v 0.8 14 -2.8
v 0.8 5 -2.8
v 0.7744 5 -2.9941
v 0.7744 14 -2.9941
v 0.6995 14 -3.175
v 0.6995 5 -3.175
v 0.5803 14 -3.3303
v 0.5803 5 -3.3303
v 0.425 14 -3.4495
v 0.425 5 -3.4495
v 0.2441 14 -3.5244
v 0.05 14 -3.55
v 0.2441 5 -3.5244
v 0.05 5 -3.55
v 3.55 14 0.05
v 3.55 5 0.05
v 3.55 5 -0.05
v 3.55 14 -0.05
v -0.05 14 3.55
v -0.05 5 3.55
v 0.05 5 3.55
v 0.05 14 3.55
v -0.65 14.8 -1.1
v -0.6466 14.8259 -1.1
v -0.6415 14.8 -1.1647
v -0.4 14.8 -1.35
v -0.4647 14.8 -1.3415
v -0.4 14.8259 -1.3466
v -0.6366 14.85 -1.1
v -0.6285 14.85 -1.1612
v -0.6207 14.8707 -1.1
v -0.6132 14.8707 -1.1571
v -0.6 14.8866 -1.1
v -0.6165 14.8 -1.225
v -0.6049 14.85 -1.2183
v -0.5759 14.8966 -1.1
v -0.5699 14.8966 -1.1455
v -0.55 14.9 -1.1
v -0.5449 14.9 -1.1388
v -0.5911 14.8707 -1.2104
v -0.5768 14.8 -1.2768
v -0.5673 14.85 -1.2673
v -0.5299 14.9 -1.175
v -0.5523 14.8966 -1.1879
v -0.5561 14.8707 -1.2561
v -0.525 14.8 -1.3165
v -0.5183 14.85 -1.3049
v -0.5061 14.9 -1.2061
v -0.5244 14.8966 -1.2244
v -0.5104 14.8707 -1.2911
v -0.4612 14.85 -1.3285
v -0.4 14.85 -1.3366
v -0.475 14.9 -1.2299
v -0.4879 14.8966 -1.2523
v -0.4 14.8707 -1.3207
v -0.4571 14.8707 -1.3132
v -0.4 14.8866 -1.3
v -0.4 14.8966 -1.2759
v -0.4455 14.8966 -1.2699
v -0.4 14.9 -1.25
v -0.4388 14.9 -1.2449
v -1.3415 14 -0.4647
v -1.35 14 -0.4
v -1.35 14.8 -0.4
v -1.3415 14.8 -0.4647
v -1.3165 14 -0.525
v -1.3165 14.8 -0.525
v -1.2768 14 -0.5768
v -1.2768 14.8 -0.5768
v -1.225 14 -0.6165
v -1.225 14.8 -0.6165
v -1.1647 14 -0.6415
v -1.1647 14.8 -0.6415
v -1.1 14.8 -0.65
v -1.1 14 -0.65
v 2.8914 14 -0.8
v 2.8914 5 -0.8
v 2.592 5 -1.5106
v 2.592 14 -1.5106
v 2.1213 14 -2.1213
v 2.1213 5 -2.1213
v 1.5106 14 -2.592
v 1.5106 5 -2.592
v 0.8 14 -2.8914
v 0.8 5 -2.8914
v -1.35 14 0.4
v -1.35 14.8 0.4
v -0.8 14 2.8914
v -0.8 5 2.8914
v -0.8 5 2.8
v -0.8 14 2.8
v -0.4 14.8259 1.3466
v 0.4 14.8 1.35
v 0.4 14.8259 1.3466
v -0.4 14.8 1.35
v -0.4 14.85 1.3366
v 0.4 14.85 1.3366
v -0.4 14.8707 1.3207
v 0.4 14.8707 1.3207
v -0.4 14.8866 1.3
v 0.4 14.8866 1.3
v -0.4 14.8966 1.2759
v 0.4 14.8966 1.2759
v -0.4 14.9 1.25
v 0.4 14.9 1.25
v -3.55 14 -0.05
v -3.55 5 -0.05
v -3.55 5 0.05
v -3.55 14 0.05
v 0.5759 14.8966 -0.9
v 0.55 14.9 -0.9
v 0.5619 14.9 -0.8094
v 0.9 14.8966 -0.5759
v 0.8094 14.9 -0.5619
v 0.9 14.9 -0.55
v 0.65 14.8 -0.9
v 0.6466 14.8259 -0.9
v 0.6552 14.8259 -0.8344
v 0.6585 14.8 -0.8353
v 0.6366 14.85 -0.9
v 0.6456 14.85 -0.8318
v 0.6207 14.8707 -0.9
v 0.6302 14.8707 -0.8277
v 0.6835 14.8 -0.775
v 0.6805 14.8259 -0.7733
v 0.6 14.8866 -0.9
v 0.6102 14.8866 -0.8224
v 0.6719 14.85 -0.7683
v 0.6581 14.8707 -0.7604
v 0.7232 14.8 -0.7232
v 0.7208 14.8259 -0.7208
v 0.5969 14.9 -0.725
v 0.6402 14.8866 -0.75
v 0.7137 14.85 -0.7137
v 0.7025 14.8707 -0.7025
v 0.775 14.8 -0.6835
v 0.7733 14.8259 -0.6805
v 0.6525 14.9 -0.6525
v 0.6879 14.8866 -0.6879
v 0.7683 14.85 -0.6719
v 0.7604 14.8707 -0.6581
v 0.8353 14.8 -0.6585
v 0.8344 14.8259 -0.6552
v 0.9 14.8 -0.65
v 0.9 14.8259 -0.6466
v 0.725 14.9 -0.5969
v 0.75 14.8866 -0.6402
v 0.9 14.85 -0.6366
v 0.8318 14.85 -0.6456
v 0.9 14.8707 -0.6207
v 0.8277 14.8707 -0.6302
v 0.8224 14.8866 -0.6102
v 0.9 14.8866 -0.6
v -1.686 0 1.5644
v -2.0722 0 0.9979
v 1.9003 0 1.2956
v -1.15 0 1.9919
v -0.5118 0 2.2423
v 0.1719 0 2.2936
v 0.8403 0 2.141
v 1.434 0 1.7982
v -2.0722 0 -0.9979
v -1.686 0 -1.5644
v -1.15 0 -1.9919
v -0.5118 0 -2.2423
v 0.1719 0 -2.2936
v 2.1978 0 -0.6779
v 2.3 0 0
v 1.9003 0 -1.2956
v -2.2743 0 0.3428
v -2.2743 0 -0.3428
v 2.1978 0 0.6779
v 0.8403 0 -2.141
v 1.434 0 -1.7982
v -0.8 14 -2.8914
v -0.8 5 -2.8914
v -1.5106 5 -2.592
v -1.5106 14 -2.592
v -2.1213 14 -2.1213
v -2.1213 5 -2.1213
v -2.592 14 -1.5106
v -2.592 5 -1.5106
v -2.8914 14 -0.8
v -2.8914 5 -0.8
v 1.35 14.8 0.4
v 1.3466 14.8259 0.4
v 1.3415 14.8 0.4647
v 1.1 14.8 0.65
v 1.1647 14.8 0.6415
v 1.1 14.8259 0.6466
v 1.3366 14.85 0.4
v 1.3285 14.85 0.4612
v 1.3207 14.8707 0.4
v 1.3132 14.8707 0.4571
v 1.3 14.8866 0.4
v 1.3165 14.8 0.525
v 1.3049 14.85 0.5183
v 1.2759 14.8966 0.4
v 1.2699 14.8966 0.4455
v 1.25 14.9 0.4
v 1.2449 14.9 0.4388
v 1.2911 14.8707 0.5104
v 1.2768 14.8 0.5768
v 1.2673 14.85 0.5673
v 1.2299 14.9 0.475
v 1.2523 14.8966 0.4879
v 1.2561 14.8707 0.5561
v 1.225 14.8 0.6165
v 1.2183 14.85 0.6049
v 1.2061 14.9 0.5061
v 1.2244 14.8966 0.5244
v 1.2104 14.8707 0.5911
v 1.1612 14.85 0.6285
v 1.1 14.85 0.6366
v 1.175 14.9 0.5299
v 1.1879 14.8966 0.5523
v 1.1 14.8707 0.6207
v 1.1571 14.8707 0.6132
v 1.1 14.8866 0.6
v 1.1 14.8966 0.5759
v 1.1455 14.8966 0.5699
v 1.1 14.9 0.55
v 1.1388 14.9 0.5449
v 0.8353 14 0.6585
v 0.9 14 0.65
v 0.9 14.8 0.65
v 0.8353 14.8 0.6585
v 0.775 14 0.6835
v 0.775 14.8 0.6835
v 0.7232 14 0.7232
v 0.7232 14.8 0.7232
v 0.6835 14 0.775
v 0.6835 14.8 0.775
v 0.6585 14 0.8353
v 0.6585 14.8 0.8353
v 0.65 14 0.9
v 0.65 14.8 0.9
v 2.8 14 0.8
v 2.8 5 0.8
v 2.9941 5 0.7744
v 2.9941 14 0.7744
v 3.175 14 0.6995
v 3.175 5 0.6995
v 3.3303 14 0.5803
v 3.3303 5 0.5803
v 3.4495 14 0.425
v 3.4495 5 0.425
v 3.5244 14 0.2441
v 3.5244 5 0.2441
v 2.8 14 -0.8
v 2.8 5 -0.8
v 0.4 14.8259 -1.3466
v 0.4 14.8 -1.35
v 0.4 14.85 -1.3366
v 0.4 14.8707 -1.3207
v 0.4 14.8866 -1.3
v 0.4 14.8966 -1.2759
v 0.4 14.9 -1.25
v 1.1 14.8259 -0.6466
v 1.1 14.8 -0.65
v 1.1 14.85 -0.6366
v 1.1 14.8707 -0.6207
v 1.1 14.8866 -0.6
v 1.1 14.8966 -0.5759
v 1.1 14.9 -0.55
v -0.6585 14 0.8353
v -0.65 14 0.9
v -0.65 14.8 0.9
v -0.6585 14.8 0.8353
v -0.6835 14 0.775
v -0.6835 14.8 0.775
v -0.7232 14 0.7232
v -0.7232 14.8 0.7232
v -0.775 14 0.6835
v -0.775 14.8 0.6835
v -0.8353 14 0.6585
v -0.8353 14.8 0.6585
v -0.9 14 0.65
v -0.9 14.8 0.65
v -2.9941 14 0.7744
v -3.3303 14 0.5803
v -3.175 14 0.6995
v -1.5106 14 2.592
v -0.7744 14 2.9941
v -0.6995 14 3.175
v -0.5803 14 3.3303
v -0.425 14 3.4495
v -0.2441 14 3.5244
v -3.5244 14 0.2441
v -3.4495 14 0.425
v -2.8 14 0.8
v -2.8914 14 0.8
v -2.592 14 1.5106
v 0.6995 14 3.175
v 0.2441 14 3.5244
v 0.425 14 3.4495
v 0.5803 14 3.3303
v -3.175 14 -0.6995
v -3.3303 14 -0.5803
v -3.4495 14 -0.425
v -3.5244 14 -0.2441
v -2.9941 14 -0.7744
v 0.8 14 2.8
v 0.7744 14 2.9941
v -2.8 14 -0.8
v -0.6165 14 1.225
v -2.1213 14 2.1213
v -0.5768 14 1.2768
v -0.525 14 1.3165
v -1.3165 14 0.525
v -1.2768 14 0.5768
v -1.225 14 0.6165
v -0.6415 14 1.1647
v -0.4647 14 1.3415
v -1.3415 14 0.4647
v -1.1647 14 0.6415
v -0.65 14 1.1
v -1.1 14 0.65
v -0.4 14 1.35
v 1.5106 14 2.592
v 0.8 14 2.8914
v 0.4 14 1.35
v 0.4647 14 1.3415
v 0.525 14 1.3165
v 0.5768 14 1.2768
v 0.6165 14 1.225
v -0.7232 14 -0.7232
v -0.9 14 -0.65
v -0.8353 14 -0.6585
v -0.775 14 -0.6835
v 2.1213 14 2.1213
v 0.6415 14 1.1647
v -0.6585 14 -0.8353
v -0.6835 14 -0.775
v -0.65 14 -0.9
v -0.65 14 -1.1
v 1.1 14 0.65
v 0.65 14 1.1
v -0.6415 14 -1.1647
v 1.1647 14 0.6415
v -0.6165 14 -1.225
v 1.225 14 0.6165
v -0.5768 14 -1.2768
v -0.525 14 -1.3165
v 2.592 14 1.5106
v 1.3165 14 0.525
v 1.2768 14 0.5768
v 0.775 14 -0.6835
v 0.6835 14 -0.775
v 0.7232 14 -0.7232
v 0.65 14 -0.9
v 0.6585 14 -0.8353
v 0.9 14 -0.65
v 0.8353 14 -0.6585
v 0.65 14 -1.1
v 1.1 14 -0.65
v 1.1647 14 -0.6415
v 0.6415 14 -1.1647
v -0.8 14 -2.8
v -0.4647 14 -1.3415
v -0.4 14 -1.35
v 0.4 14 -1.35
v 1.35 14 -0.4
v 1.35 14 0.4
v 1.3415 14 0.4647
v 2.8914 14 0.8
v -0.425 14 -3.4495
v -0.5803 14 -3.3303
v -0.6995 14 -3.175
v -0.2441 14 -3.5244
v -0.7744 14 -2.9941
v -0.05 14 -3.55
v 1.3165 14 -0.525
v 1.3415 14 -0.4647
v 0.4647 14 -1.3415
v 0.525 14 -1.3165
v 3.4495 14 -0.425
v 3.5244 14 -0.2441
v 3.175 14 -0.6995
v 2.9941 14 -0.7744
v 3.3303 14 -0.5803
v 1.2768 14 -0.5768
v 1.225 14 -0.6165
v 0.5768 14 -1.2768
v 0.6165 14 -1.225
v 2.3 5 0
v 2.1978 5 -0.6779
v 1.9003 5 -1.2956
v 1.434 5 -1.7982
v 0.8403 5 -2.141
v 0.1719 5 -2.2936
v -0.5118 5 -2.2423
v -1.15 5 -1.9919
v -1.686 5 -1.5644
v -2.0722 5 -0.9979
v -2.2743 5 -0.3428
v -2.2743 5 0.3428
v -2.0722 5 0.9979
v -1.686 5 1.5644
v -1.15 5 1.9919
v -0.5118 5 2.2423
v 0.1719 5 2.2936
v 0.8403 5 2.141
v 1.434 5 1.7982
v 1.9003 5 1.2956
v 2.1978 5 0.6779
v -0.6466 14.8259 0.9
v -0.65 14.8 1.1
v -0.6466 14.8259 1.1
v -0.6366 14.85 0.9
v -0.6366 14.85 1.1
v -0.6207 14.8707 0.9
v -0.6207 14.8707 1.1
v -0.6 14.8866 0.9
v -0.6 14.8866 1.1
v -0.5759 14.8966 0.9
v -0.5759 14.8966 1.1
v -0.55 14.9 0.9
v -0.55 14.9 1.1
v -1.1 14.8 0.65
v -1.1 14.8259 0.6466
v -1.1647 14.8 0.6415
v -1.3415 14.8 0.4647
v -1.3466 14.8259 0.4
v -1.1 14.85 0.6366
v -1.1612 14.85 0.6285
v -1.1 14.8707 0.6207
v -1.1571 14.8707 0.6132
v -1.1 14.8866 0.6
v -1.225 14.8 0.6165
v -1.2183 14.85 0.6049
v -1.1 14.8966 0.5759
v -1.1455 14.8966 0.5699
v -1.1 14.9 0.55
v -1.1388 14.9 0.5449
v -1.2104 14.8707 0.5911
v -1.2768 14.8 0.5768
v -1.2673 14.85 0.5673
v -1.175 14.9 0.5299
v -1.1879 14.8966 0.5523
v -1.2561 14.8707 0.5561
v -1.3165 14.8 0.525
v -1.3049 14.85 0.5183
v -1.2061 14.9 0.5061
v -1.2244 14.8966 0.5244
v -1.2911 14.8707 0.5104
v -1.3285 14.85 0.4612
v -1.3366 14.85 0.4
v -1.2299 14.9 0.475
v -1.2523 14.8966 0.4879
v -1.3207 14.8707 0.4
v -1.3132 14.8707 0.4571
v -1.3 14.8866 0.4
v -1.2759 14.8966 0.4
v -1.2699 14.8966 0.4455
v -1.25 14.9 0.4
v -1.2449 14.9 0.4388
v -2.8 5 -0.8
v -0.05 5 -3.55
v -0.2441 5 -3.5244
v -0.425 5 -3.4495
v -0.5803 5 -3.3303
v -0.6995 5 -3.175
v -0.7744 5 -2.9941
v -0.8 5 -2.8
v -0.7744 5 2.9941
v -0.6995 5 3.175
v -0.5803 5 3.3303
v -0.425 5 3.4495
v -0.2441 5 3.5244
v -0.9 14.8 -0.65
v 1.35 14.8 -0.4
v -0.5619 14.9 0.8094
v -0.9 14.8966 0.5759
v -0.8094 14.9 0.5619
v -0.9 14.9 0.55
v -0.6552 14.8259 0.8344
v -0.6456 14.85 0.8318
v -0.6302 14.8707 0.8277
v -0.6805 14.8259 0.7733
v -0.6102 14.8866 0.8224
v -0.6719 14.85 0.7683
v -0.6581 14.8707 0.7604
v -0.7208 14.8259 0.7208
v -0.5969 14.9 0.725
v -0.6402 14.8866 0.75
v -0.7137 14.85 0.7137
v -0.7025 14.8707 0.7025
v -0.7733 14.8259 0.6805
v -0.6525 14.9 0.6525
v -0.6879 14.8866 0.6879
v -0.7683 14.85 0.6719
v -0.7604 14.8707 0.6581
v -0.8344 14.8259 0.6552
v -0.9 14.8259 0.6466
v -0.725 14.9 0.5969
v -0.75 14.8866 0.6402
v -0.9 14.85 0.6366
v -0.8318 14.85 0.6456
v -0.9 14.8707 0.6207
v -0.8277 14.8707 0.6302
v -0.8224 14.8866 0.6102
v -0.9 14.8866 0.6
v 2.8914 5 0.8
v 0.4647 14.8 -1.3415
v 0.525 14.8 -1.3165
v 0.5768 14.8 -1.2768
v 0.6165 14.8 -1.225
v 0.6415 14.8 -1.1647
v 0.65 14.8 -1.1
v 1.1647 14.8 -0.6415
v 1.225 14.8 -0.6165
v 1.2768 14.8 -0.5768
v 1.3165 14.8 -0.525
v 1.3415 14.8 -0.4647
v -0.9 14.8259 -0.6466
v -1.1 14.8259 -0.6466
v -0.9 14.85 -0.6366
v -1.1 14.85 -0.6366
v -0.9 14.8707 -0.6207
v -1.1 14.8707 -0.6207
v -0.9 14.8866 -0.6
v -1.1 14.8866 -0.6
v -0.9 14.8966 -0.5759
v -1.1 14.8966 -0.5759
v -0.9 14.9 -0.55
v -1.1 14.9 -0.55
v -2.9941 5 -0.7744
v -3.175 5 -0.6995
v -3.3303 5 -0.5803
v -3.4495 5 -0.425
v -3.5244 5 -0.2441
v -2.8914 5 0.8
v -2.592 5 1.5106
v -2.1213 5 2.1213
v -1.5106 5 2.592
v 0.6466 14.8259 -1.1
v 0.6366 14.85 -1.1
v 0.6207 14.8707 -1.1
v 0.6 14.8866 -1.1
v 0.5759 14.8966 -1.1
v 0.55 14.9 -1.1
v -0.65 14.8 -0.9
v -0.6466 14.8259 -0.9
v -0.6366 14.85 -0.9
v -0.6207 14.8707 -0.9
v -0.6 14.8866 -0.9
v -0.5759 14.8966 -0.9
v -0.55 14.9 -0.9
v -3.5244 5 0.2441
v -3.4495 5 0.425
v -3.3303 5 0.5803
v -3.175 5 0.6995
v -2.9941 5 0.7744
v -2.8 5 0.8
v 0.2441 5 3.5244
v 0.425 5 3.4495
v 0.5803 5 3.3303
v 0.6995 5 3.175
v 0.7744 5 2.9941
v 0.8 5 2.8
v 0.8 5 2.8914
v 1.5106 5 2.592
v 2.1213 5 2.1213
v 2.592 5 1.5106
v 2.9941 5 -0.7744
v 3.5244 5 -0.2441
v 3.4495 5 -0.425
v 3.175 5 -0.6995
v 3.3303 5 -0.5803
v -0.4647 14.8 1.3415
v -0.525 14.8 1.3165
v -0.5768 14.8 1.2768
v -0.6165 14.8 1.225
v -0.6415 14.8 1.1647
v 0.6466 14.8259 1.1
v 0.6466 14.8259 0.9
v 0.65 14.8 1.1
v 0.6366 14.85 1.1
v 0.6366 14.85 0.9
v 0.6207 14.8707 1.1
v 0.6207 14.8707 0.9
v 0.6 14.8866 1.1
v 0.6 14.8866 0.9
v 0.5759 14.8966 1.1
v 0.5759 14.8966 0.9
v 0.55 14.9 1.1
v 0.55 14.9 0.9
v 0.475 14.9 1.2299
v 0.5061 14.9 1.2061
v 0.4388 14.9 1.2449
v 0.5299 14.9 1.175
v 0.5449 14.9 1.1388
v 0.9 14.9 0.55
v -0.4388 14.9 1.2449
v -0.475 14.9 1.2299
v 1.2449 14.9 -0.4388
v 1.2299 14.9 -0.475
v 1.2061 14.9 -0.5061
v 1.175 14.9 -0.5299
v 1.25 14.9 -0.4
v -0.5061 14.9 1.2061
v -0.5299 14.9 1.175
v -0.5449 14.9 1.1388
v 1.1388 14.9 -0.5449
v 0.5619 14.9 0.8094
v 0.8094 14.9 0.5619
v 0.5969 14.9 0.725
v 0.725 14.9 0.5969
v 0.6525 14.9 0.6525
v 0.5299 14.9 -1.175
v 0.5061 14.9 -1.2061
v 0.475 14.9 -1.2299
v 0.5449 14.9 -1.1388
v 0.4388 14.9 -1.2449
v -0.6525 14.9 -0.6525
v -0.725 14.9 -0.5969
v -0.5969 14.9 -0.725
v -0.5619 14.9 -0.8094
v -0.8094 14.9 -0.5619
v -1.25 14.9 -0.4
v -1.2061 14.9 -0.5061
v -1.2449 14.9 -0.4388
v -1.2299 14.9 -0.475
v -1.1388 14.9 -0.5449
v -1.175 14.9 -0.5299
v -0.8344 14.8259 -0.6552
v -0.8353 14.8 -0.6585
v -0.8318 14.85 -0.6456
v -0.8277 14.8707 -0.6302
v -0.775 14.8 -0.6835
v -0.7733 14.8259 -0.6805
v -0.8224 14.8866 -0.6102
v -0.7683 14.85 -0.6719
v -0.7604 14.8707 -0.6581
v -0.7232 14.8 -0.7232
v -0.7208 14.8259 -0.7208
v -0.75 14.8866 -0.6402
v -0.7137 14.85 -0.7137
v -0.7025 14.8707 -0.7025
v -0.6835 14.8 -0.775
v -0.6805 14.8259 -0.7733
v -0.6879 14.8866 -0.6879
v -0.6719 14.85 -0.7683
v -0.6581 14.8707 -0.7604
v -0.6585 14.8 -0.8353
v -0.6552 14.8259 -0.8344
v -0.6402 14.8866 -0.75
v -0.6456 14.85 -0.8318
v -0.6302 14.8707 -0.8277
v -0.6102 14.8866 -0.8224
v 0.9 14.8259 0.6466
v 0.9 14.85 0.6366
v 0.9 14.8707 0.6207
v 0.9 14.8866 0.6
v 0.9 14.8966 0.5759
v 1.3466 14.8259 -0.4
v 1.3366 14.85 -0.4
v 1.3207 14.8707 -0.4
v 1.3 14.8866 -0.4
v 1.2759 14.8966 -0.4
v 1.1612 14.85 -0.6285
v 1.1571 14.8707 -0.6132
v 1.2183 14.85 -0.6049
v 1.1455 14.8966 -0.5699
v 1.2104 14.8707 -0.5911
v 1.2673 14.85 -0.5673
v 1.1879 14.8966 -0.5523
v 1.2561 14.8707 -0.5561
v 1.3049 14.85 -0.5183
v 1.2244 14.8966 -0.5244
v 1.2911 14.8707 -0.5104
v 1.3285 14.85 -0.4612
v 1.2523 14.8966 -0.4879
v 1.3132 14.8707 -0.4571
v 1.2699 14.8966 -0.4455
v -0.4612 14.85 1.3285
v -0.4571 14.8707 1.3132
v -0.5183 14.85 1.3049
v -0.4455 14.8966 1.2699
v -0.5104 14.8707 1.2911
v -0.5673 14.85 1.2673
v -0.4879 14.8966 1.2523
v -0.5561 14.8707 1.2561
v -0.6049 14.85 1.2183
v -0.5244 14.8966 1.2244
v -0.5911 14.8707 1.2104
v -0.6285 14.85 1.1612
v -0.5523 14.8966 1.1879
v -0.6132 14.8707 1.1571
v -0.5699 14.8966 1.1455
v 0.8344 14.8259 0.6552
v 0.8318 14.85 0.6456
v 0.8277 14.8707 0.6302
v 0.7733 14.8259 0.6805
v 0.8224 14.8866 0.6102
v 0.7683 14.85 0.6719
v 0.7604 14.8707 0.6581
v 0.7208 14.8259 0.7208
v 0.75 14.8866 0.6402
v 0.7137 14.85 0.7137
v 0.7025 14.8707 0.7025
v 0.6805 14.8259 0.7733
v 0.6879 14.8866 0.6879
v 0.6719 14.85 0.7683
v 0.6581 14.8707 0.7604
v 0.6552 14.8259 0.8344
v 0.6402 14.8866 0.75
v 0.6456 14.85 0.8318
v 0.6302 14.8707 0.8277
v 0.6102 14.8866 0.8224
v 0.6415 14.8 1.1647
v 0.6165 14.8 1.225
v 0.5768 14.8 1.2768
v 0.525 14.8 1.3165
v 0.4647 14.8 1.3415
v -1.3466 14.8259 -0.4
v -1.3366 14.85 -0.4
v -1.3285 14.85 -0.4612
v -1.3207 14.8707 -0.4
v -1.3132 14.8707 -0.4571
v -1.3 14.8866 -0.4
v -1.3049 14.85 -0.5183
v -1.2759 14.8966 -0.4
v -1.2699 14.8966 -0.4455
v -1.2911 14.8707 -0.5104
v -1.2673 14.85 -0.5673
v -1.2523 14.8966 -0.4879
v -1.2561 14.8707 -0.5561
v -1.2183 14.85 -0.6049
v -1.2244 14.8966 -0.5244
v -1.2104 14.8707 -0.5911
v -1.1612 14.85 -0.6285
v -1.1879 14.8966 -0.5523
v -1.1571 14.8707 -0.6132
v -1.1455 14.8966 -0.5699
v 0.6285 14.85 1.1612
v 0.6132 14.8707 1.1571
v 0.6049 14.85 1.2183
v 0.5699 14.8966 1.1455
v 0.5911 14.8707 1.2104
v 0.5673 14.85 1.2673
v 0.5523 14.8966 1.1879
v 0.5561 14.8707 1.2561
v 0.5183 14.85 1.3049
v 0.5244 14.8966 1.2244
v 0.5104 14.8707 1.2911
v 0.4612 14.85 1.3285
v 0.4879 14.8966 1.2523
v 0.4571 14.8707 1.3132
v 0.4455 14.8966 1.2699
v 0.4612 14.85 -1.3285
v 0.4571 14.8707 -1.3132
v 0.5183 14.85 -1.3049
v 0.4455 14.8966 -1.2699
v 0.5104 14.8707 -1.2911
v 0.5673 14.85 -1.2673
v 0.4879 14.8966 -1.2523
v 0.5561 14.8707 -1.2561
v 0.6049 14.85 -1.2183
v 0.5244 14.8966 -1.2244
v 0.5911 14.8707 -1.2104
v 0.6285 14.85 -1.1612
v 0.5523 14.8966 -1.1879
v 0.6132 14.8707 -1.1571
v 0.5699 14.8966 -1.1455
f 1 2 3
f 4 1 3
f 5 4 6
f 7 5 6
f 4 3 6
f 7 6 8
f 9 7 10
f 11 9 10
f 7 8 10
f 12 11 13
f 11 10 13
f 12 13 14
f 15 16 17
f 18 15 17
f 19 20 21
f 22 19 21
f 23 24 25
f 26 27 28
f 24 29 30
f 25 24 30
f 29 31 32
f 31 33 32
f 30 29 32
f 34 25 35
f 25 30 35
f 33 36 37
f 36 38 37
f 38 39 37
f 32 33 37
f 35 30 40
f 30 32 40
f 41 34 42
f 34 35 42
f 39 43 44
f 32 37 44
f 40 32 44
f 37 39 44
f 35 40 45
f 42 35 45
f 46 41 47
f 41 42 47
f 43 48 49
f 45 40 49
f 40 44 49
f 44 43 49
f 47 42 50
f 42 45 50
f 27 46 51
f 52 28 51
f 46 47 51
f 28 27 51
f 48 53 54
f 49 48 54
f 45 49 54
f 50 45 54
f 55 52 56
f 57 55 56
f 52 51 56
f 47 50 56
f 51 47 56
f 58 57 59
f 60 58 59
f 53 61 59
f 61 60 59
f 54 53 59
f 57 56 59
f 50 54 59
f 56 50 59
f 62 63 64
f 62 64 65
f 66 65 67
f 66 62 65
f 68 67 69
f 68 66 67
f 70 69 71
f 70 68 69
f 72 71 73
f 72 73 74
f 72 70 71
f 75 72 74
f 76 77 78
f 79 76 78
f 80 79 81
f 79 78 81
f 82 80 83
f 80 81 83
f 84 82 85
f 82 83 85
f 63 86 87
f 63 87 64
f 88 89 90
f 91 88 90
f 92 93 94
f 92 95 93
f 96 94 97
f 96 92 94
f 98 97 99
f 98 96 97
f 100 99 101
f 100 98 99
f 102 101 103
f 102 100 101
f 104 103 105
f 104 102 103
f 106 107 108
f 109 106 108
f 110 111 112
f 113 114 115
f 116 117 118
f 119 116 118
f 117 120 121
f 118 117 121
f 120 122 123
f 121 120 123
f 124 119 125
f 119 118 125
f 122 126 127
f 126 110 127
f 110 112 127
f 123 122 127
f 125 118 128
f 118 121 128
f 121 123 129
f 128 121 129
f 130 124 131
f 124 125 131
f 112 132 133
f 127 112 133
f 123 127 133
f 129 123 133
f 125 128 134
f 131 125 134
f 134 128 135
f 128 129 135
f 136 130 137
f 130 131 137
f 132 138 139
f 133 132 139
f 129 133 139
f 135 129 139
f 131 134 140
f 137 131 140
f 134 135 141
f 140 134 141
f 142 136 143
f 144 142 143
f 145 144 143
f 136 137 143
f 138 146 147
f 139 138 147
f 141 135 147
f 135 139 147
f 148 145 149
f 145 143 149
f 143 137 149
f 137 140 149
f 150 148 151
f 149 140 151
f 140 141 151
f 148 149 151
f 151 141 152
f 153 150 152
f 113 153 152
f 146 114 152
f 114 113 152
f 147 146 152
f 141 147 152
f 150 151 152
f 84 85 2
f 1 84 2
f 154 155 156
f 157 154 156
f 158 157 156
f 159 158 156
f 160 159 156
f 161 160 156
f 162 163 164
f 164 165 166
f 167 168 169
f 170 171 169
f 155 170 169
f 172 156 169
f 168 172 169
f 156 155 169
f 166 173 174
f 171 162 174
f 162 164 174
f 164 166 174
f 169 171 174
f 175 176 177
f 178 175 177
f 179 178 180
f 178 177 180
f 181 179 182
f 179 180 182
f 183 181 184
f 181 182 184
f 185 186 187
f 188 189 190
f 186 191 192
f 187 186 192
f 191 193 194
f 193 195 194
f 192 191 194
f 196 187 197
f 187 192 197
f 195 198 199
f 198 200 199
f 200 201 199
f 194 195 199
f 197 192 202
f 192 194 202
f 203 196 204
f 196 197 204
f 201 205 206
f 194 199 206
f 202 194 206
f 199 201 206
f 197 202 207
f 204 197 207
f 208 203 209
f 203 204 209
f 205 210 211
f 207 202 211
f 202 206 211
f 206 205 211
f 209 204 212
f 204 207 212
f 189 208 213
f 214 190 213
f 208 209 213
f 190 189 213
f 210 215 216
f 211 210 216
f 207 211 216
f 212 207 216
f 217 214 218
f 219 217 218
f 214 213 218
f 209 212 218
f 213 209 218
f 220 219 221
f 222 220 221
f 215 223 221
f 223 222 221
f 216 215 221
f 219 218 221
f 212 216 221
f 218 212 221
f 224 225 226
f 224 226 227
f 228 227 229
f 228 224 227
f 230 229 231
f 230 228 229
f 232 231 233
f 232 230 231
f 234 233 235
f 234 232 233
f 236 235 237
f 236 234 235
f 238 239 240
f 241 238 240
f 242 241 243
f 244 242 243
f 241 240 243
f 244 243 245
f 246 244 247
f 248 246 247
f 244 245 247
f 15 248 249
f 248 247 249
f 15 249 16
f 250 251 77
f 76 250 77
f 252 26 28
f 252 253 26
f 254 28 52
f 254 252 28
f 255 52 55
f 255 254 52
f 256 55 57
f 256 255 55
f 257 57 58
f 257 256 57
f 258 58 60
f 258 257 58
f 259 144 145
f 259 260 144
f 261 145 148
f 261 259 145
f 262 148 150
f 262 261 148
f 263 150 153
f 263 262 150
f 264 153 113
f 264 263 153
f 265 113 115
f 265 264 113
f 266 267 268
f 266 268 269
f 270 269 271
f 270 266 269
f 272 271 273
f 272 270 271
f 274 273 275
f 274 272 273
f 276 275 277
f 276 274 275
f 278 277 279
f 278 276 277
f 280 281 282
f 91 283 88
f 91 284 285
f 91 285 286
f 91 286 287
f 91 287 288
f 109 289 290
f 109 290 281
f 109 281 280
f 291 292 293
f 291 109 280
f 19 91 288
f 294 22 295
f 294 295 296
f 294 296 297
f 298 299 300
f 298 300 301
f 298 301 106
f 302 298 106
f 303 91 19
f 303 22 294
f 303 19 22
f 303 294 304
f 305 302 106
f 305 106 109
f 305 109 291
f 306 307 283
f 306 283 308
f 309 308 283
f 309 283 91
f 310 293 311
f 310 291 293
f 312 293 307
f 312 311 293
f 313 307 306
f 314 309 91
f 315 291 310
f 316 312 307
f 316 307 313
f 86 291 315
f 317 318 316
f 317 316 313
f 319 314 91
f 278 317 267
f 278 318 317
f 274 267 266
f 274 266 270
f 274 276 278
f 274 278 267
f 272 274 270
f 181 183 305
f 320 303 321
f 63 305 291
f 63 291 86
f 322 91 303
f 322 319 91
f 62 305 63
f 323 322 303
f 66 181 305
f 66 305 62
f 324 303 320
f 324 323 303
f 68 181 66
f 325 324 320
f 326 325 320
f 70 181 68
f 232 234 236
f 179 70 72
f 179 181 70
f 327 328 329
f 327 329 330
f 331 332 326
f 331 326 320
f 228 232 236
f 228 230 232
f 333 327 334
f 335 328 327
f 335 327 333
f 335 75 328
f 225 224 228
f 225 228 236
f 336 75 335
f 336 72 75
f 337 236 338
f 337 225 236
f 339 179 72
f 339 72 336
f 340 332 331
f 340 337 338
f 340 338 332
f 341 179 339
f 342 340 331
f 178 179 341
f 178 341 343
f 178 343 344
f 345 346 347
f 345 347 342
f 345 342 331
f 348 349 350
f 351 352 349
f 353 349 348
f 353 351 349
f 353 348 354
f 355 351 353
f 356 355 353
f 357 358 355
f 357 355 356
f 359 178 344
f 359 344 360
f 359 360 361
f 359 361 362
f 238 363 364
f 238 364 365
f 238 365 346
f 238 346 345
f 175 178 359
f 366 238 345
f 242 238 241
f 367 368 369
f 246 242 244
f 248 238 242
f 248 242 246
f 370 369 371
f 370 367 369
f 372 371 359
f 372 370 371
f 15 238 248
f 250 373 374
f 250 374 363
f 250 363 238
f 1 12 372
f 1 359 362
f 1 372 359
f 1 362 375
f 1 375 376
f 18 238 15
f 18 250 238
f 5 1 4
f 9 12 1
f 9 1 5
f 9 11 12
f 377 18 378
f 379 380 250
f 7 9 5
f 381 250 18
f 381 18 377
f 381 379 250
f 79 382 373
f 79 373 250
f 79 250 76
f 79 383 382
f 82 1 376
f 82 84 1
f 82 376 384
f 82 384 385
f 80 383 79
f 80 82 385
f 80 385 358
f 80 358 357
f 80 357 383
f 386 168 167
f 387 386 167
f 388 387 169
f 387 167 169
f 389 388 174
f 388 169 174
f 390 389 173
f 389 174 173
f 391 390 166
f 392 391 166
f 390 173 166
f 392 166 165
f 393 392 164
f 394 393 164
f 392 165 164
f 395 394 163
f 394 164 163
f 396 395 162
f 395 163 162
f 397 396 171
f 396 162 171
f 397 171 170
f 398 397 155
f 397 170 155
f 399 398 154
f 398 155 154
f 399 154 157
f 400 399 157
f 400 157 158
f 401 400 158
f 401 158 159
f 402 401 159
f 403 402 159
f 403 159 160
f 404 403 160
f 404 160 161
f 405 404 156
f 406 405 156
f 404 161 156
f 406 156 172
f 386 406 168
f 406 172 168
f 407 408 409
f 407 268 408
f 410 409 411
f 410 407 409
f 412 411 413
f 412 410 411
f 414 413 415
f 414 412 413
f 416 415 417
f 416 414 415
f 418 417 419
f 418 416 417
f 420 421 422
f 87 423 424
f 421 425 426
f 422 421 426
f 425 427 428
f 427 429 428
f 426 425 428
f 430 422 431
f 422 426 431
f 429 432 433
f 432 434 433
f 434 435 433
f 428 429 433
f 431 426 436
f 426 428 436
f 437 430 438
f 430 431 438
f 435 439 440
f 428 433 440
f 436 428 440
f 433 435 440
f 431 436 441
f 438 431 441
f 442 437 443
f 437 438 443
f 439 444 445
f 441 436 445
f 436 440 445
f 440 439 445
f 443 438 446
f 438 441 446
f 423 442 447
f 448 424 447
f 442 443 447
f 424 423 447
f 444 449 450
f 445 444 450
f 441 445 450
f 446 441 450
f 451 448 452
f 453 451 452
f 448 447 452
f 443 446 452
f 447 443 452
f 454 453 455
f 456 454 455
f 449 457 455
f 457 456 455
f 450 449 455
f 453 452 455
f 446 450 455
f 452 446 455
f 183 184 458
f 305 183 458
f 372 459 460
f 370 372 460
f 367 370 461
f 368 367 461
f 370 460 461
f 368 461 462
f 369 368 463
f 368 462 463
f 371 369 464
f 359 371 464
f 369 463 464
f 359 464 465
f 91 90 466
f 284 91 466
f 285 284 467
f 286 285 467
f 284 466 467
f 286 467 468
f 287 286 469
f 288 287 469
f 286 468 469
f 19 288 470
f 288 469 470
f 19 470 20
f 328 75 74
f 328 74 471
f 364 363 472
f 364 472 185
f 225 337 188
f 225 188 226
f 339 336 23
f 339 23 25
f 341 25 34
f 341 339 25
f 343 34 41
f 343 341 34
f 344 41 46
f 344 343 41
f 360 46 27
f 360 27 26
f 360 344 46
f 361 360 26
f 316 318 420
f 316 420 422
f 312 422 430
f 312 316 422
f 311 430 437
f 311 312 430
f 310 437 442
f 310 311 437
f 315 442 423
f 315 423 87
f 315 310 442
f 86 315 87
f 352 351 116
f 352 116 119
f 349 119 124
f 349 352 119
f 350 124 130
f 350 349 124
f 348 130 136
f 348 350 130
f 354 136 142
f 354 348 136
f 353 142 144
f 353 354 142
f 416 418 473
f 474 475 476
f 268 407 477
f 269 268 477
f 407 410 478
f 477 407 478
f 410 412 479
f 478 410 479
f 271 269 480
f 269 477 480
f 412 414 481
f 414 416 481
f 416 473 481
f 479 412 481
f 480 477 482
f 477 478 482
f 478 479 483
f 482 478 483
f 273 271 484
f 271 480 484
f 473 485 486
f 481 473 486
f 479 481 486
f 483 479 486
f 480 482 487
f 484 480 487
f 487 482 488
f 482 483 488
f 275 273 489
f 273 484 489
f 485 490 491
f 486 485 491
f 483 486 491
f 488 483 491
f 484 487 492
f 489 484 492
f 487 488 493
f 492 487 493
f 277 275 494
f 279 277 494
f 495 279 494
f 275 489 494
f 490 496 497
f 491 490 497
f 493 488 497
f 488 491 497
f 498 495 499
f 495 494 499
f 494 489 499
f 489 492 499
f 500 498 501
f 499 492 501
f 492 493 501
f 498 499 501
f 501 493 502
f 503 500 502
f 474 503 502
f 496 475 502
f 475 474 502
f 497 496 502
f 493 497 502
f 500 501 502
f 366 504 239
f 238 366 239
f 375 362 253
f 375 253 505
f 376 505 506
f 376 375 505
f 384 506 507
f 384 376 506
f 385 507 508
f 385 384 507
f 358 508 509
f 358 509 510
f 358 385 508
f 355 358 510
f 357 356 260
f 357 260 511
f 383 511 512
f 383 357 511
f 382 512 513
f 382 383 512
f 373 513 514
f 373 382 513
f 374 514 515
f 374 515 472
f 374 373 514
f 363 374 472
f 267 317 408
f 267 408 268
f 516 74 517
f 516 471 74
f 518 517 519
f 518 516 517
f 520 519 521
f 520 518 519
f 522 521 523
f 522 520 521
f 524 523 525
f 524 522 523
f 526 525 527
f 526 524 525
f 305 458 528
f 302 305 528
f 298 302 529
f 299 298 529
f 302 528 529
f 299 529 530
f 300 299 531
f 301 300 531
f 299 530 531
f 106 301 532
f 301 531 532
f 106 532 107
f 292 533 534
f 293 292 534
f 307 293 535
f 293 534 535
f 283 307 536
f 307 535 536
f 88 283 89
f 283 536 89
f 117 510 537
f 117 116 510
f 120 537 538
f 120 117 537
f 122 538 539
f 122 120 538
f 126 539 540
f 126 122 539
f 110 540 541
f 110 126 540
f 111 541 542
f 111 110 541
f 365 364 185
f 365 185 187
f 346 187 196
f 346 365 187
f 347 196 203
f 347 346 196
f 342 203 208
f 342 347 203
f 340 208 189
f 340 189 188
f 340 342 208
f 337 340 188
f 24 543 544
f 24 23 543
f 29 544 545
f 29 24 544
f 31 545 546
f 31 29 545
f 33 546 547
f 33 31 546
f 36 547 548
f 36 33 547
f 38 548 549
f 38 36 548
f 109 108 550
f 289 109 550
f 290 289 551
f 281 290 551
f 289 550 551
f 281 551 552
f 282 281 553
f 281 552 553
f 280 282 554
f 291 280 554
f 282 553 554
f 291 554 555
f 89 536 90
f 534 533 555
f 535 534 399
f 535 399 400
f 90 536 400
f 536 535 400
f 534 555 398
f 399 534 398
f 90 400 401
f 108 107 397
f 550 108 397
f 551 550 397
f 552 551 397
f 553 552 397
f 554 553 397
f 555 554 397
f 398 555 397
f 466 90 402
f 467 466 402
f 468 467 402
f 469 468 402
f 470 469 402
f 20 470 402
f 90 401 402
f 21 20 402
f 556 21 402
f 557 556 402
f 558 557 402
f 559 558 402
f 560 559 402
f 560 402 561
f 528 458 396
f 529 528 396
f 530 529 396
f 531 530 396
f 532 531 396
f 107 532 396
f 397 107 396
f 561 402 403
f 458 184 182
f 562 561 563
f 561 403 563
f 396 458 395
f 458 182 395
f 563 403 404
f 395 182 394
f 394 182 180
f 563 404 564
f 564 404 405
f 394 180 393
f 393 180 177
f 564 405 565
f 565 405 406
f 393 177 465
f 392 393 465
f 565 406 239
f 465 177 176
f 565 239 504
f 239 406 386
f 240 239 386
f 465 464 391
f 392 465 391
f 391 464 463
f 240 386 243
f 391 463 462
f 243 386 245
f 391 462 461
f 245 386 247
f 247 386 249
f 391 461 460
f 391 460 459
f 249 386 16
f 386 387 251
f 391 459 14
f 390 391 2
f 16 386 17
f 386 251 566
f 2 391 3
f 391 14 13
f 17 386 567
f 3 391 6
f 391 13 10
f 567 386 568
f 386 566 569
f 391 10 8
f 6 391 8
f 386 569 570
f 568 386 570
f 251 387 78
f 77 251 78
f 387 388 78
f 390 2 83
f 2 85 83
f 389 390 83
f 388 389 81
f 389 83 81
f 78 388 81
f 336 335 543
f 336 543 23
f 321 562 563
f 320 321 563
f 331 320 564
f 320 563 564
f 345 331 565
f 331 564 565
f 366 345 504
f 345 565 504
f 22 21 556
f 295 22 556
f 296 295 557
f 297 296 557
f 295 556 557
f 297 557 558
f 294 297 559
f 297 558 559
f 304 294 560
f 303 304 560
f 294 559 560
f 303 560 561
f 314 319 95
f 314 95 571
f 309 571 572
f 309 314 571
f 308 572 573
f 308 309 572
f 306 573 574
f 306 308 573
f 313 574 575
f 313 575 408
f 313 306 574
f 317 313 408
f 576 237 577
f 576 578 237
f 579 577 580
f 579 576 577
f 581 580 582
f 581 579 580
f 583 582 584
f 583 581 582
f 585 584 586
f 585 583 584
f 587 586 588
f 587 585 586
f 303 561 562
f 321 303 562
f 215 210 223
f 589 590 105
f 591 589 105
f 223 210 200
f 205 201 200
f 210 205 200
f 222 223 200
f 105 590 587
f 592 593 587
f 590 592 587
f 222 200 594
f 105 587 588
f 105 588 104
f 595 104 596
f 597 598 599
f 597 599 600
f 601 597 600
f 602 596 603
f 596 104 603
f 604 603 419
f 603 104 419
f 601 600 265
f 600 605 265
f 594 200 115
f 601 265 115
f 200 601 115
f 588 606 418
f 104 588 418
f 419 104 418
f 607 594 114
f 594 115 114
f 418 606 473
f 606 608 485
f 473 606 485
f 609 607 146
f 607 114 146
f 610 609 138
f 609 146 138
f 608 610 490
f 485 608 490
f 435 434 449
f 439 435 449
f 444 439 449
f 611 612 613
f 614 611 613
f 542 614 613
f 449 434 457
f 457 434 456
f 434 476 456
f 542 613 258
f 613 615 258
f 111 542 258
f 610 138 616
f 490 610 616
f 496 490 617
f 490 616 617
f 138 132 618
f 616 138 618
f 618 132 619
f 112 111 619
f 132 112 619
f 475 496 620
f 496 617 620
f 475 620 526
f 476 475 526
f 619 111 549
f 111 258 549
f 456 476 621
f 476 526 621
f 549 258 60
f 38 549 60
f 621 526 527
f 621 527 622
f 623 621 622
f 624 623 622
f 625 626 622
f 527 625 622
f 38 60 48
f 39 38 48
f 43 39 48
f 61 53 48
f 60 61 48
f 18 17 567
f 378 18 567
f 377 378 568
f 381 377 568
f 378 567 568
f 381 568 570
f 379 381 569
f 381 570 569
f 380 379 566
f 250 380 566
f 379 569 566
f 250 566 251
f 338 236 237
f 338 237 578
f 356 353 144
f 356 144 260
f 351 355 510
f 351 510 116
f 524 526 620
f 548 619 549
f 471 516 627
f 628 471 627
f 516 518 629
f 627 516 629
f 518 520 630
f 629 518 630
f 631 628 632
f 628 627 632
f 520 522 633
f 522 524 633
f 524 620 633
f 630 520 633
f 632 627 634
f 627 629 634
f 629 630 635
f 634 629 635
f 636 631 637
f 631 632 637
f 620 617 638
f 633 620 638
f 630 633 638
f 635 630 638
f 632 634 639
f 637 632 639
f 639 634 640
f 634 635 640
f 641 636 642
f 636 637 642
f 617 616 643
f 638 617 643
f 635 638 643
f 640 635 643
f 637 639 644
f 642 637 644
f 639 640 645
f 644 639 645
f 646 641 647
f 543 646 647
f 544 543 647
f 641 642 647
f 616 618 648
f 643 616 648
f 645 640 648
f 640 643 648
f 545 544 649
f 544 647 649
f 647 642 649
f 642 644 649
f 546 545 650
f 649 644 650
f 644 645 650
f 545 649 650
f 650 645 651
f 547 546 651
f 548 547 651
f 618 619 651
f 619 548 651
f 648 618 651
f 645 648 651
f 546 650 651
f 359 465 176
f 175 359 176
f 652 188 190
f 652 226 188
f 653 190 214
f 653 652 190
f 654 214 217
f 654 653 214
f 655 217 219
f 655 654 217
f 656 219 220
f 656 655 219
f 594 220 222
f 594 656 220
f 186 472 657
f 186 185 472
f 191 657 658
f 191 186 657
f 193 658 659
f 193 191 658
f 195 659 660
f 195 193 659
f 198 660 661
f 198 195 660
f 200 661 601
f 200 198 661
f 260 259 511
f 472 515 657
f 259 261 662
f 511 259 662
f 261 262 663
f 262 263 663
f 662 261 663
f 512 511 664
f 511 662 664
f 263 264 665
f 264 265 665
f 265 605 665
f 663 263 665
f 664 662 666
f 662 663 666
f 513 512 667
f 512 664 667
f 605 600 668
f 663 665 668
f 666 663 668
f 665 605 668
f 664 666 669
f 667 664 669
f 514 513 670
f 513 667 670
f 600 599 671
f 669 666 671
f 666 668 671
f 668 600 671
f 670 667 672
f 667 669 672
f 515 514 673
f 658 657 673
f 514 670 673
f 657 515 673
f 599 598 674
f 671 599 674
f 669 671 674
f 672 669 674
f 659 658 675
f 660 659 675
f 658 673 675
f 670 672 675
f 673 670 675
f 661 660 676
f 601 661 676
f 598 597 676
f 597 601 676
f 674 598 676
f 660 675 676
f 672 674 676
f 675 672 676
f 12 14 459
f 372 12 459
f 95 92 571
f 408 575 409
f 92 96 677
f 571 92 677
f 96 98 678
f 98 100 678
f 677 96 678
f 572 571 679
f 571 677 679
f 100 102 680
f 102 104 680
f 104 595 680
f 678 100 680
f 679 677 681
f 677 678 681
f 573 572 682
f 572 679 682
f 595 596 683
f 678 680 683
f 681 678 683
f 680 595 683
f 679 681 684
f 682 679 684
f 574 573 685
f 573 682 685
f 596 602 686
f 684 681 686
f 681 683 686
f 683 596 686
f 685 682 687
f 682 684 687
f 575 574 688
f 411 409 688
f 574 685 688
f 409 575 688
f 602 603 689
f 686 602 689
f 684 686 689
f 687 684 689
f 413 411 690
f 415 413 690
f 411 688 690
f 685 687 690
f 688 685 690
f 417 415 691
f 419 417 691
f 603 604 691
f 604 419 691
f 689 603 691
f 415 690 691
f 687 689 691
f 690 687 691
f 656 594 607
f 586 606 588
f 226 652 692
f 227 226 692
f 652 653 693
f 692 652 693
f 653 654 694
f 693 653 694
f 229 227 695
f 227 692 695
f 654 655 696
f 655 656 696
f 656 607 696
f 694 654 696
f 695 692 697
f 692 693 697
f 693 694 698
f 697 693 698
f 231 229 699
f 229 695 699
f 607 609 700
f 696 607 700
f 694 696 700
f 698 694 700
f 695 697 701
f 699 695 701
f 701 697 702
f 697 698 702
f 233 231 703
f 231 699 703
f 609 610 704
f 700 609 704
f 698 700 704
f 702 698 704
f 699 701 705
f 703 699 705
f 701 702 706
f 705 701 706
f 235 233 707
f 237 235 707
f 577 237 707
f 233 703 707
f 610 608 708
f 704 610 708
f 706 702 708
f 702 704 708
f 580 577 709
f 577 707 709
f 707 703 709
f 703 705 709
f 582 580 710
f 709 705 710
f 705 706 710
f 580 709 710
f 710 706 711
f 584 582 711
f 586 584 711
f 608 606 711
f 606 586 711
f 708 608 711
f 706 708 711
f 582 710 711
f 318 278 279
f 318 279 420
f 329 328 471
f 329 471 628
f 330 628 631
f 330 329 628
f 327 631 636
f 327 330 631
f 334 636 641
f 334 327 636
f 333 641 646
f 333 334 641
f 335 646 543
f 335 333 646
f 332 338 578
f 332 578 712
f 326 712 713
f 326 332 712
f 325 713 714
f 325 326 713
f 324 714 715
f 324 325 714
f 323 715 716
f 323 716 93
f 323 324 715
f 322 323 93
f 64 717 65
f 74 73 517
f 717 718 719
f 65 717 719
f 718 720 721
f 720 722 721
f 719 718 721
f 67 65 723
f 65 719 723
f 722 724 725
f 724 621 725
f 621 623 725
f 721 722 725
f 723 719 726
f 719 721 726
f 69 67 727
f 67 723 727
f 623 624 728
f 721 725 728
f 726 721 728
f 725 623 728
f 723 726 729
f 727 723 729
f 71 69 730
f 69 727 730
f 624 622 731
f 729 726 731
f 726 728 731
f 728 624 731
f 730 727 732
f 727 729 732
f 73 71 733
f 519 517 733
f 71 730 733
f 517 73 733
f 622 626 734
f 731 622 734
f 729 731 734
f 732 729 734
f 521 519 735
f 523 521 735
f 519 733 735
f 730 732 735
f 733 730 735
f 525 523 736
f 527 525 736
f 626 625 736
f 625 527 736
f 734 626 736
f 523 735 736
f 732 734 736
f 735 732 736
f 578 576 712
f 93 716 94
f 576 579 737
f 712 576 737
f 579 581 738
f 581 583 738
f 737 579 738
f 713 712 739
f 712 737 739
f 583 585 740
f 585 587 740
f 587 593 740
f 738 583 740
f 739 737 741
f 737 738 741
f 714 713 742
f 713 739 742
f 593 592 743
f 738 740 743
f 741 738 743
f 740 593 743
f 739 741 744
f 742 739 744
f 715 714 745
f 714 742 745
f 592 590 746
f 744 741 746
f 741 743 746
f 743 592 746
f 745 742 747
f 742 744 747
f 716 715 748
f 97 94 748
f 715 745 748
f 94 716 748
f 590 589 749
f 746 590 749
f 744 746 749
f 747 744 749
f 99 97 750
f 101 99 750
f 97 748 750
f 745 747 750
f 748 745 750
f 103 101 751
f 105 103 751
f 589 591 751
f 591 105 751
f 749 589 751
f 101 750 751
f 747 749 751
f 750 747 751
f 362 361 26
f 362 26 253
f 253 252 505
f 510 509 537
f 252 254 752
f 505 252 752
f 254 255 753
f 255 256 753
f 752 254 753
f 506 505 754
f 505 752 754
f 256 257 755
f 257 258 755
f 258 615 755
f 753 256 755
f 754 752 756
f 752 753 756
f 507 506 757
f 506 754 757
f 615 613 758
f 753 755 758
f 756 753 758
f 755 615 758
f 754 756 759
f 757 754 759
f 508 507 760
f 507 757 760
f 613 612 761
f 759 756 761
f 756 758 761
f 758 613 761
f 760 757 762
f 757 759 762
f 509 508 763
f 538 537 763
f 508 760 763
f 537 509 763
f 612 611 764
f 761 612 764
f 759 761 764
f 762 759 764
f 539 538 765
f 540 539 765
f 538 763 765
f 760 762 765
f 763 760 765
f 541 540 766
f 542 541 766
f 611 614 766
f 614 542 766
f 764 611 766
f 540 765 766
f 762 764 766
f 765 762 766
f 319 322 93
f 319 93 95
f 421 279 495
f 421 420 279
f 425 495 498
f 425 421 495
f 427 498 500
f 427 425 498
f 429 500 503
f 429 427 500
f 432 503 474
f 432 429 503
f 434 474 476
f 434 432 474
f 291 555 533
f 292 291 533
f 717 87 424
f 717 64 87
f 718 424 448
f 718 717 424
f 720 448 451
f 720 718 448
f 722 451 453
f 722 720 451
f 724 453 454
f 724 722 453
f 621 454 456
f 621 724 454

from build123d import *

# Parameters (mm, degrees)
SKETCH1_R           = 2.3
BOSS_EXTRUDE1_DEPTH = 5
BOSS_EXTRUDE2_DEPTH = 9
BOSS_EXTRUDE3_DEPTH = 0.9
FILLET2_R           = 0.1


with BuildPart() as part:
    # Sketch1 → Boss-Extrude1 (new body)
    with BuildSketch(Plane(origin=(0, 0, 0), x_dir=(1, 0, 0), z_dir=(0, 1, 0))):
        Circle(SKETCH1_R)
    extrude(amount=BOSS_EXTRUDE1_DEPTH)

    # Sketch2 → Boss-Extrude2 (add)
    with BuildSketch(Plane(origin=(0, 5, 0), x_dir=(1, 0, 0), z_dir=(0, 1, 0))):
        with BuildLine():
            Line((0.05, 3.55), (-0.05, 3.55))
            ThreePointArc((-0.05, 3.55), (-0.580330086, 3.330330086), (-0.8, 2.8))
            Line((-0.8, 2.8), (-0.8, 2.891366459))
            ThreePointArc((-0.8, 2.891366459), (-2.121320344, 2.121320344), (-2.891366459, 0.8))
            Line((-2.891366459, 0.8), (-2.8, 0.8))
            ThreePointArc((-2.8, 0.8), (-3.330330086, 0.580330086), (-3.55, 0.05))
            Line((-3.55, 0.05), (-3.55, -0.05))
            ThreePointArc((-3.55, -0.05), (-3.330330086, -0.580330086), (-2.8, -0.8))
            Line((-2.8, -0.8), (-2.891366459, -0.8))
            ThreePointArc((-2.891366459, -0.8), (-2.121320344, -2.121320344), (-0.8, -2.891366459))
            Line((-0.8, -2.891366459), (-0.8, -2.8))
            ThreePointArc((-0.8, -2.8), (-0.580330086, -3.330330086), (-0.05, -3.55))
            Line((-0.05, -3.55), (0.05, -3.55))
            ThreePointArc((0.05, -3.55), (0.580330086, -3.330330086), (0.8, -2.8))
            Line((0.8, -2.8), (0.8, -2.891366459))
            ThreePointArc((0.8, -2.891366459), (2.121320344, -2.121320344), (2.891366459, -0.8))
            Line((2.891366459, -0.8), (2.8, -0.8))
            ThreePointArc((2.8, -0.8), (3.330330086, -0.580330086), (3.55, -0.05))
            Line((3.55, -0.05), (3.55, 0.05))
            ThreePointArc((3.55, 0.05), (3.330330086, 0.580330086), (2.8, 0.8))
            Line((2.8, 0.8), (2.891366459, 0.8))
            ThreePointArc((2.891366459, 0.8), (2.121320344, 2.121320344), (0.8, 2.891366459))
            Line((0.8, 2.891366459), (0.8, 2.8))
            ThreePointArc((0.8, 2.8), (0.580330086, 3.330330086), (0.05, 3.55))
        make_face()
    extrude(amount=BOSS_EXTRUDE2_DEPTH)

    # Sketch3 → Boss-Extrude3 (add)
    with BuildSketch(Plane(origin=(0, 14, 0), x_dir=(1, 0, 0), z_dir=(0, 1, 0))):
        with BuildLine():
            Line((-0.4, 1.35), (0.4, 1.35))
            ThreePointArc((0.4, 1.35), (0.576776695, 1.276776695), (0.65, 1.1))
            Line((0.65, 1.1), (0.65, 0.9))
            ThreePointArc((0.65, 0.9), (0.723223305, 0.723223305), (0.9, 0.65))
            Line((0.9, 0.65), (1.1, 0.65))
            ThreePointArc((1.1, 0.65), (1.276776695, 0.576776695), (1.35, 0.4))
            Line((1.35, 0.4), (1.35, -0.4))
            ThreePointArc((1.35, -0.4), (1.276776695, -0.576776695), (1.1, -0.65))
            Line((1.1, -0.65), (0.9, -0.65))
            ThreePointArc((0.9, -0.65), (0.723223305, -0.723223305), (0.65, -0.9))
            Line((0.65, -0.9), (0.65, -1.1))
            ThreePointArc((0.65, -1.1), (0.576776695, -1.276776695), (0.4, -1.35))
            Line((0.4, -1.35), (-0.4, -1.35))
            ThreePointArc((-0.4, -1.35), (-0.576776695, -1.276776695), (-0.65, -1.1))
            Line((-0.65, -1.1), (-0.65, -0.9))
            ThreePointArc((-0.65, -0.9), (-0.723223305, -0.723223305), (-0.9, -0.65))
            Line((-0.9, -0.65), (-1.1, -0.65))
            ThreePointArc((-1.1, -0.65), (-1.276776695, -0.576776695), (-1.35, -0.4))
            Line((-1.35, -0.4), (-1.35, 0.4))
            ThreePointArc((-1.35, 0.4), (-1.276776695, 0.576776695), (-1.1, 0.65))
            Line((-1.1, 0.65), (-0.9, 0.65))
            ThreePointArc((-0.9, 0.65), (-0.723223305, 0.723223305), (-0.65, 0.9))
            Line((-0.65, 0.9), (-0.65, 1.1))
            ThreePointArc((-0.65, 1.1), (-0.576776695, 1.276776695), (-0.4, 1.35))
        make_face()
    extrude(amount=BOSS_EXTRUDE3_DEPTH)

    # Fillet2
    fillet2_edges = [part.edges().sort_by_distance(p)[0] for p in [
        (0.723223305, 14.9, 0.723223305),
        (1, 14.9, 0.65),
        (1.276776695, 14.9, 0.576776695),
        (1.35, 14.9, 0),
        (1.276776695, 14.9, -0.576776695),
        (1, 14.9, -0.65),
        (0.723223305, 14.9, -0.723223305),
        (0.65, 14.9, -1),
        (0.576776695, 14.9, -1.276776695),
        (0, 14.9, -1.35),
        (-0.576776695, 14.9, -1.276776695),
        (-0.65, 14.9, -1),
        (-0.723223305, 14.9, -0.723223305),
        (-1, 14.9, -0.65),
        (-1.276776695, 14.9, -0.576776695),
        (-1.35, 14.9, 0),
        (-1.276776695, 14.9, 0.576776695),
        (-1, 14.9, 0.65),
        (-0.723223305, 14.9, 0.723223305),
        (-0.65, 14.9, 1),
        (-0.576776695, 14.9, 1.276776695),
        (0, 14.9, 1.35),
        (0.576776695, 14.9, 1.276776695),
        (0.65, 14.9, 1),
    ]]
    fillet(fillet2_edges, radius=FILLET2_R)


solid = part.part
